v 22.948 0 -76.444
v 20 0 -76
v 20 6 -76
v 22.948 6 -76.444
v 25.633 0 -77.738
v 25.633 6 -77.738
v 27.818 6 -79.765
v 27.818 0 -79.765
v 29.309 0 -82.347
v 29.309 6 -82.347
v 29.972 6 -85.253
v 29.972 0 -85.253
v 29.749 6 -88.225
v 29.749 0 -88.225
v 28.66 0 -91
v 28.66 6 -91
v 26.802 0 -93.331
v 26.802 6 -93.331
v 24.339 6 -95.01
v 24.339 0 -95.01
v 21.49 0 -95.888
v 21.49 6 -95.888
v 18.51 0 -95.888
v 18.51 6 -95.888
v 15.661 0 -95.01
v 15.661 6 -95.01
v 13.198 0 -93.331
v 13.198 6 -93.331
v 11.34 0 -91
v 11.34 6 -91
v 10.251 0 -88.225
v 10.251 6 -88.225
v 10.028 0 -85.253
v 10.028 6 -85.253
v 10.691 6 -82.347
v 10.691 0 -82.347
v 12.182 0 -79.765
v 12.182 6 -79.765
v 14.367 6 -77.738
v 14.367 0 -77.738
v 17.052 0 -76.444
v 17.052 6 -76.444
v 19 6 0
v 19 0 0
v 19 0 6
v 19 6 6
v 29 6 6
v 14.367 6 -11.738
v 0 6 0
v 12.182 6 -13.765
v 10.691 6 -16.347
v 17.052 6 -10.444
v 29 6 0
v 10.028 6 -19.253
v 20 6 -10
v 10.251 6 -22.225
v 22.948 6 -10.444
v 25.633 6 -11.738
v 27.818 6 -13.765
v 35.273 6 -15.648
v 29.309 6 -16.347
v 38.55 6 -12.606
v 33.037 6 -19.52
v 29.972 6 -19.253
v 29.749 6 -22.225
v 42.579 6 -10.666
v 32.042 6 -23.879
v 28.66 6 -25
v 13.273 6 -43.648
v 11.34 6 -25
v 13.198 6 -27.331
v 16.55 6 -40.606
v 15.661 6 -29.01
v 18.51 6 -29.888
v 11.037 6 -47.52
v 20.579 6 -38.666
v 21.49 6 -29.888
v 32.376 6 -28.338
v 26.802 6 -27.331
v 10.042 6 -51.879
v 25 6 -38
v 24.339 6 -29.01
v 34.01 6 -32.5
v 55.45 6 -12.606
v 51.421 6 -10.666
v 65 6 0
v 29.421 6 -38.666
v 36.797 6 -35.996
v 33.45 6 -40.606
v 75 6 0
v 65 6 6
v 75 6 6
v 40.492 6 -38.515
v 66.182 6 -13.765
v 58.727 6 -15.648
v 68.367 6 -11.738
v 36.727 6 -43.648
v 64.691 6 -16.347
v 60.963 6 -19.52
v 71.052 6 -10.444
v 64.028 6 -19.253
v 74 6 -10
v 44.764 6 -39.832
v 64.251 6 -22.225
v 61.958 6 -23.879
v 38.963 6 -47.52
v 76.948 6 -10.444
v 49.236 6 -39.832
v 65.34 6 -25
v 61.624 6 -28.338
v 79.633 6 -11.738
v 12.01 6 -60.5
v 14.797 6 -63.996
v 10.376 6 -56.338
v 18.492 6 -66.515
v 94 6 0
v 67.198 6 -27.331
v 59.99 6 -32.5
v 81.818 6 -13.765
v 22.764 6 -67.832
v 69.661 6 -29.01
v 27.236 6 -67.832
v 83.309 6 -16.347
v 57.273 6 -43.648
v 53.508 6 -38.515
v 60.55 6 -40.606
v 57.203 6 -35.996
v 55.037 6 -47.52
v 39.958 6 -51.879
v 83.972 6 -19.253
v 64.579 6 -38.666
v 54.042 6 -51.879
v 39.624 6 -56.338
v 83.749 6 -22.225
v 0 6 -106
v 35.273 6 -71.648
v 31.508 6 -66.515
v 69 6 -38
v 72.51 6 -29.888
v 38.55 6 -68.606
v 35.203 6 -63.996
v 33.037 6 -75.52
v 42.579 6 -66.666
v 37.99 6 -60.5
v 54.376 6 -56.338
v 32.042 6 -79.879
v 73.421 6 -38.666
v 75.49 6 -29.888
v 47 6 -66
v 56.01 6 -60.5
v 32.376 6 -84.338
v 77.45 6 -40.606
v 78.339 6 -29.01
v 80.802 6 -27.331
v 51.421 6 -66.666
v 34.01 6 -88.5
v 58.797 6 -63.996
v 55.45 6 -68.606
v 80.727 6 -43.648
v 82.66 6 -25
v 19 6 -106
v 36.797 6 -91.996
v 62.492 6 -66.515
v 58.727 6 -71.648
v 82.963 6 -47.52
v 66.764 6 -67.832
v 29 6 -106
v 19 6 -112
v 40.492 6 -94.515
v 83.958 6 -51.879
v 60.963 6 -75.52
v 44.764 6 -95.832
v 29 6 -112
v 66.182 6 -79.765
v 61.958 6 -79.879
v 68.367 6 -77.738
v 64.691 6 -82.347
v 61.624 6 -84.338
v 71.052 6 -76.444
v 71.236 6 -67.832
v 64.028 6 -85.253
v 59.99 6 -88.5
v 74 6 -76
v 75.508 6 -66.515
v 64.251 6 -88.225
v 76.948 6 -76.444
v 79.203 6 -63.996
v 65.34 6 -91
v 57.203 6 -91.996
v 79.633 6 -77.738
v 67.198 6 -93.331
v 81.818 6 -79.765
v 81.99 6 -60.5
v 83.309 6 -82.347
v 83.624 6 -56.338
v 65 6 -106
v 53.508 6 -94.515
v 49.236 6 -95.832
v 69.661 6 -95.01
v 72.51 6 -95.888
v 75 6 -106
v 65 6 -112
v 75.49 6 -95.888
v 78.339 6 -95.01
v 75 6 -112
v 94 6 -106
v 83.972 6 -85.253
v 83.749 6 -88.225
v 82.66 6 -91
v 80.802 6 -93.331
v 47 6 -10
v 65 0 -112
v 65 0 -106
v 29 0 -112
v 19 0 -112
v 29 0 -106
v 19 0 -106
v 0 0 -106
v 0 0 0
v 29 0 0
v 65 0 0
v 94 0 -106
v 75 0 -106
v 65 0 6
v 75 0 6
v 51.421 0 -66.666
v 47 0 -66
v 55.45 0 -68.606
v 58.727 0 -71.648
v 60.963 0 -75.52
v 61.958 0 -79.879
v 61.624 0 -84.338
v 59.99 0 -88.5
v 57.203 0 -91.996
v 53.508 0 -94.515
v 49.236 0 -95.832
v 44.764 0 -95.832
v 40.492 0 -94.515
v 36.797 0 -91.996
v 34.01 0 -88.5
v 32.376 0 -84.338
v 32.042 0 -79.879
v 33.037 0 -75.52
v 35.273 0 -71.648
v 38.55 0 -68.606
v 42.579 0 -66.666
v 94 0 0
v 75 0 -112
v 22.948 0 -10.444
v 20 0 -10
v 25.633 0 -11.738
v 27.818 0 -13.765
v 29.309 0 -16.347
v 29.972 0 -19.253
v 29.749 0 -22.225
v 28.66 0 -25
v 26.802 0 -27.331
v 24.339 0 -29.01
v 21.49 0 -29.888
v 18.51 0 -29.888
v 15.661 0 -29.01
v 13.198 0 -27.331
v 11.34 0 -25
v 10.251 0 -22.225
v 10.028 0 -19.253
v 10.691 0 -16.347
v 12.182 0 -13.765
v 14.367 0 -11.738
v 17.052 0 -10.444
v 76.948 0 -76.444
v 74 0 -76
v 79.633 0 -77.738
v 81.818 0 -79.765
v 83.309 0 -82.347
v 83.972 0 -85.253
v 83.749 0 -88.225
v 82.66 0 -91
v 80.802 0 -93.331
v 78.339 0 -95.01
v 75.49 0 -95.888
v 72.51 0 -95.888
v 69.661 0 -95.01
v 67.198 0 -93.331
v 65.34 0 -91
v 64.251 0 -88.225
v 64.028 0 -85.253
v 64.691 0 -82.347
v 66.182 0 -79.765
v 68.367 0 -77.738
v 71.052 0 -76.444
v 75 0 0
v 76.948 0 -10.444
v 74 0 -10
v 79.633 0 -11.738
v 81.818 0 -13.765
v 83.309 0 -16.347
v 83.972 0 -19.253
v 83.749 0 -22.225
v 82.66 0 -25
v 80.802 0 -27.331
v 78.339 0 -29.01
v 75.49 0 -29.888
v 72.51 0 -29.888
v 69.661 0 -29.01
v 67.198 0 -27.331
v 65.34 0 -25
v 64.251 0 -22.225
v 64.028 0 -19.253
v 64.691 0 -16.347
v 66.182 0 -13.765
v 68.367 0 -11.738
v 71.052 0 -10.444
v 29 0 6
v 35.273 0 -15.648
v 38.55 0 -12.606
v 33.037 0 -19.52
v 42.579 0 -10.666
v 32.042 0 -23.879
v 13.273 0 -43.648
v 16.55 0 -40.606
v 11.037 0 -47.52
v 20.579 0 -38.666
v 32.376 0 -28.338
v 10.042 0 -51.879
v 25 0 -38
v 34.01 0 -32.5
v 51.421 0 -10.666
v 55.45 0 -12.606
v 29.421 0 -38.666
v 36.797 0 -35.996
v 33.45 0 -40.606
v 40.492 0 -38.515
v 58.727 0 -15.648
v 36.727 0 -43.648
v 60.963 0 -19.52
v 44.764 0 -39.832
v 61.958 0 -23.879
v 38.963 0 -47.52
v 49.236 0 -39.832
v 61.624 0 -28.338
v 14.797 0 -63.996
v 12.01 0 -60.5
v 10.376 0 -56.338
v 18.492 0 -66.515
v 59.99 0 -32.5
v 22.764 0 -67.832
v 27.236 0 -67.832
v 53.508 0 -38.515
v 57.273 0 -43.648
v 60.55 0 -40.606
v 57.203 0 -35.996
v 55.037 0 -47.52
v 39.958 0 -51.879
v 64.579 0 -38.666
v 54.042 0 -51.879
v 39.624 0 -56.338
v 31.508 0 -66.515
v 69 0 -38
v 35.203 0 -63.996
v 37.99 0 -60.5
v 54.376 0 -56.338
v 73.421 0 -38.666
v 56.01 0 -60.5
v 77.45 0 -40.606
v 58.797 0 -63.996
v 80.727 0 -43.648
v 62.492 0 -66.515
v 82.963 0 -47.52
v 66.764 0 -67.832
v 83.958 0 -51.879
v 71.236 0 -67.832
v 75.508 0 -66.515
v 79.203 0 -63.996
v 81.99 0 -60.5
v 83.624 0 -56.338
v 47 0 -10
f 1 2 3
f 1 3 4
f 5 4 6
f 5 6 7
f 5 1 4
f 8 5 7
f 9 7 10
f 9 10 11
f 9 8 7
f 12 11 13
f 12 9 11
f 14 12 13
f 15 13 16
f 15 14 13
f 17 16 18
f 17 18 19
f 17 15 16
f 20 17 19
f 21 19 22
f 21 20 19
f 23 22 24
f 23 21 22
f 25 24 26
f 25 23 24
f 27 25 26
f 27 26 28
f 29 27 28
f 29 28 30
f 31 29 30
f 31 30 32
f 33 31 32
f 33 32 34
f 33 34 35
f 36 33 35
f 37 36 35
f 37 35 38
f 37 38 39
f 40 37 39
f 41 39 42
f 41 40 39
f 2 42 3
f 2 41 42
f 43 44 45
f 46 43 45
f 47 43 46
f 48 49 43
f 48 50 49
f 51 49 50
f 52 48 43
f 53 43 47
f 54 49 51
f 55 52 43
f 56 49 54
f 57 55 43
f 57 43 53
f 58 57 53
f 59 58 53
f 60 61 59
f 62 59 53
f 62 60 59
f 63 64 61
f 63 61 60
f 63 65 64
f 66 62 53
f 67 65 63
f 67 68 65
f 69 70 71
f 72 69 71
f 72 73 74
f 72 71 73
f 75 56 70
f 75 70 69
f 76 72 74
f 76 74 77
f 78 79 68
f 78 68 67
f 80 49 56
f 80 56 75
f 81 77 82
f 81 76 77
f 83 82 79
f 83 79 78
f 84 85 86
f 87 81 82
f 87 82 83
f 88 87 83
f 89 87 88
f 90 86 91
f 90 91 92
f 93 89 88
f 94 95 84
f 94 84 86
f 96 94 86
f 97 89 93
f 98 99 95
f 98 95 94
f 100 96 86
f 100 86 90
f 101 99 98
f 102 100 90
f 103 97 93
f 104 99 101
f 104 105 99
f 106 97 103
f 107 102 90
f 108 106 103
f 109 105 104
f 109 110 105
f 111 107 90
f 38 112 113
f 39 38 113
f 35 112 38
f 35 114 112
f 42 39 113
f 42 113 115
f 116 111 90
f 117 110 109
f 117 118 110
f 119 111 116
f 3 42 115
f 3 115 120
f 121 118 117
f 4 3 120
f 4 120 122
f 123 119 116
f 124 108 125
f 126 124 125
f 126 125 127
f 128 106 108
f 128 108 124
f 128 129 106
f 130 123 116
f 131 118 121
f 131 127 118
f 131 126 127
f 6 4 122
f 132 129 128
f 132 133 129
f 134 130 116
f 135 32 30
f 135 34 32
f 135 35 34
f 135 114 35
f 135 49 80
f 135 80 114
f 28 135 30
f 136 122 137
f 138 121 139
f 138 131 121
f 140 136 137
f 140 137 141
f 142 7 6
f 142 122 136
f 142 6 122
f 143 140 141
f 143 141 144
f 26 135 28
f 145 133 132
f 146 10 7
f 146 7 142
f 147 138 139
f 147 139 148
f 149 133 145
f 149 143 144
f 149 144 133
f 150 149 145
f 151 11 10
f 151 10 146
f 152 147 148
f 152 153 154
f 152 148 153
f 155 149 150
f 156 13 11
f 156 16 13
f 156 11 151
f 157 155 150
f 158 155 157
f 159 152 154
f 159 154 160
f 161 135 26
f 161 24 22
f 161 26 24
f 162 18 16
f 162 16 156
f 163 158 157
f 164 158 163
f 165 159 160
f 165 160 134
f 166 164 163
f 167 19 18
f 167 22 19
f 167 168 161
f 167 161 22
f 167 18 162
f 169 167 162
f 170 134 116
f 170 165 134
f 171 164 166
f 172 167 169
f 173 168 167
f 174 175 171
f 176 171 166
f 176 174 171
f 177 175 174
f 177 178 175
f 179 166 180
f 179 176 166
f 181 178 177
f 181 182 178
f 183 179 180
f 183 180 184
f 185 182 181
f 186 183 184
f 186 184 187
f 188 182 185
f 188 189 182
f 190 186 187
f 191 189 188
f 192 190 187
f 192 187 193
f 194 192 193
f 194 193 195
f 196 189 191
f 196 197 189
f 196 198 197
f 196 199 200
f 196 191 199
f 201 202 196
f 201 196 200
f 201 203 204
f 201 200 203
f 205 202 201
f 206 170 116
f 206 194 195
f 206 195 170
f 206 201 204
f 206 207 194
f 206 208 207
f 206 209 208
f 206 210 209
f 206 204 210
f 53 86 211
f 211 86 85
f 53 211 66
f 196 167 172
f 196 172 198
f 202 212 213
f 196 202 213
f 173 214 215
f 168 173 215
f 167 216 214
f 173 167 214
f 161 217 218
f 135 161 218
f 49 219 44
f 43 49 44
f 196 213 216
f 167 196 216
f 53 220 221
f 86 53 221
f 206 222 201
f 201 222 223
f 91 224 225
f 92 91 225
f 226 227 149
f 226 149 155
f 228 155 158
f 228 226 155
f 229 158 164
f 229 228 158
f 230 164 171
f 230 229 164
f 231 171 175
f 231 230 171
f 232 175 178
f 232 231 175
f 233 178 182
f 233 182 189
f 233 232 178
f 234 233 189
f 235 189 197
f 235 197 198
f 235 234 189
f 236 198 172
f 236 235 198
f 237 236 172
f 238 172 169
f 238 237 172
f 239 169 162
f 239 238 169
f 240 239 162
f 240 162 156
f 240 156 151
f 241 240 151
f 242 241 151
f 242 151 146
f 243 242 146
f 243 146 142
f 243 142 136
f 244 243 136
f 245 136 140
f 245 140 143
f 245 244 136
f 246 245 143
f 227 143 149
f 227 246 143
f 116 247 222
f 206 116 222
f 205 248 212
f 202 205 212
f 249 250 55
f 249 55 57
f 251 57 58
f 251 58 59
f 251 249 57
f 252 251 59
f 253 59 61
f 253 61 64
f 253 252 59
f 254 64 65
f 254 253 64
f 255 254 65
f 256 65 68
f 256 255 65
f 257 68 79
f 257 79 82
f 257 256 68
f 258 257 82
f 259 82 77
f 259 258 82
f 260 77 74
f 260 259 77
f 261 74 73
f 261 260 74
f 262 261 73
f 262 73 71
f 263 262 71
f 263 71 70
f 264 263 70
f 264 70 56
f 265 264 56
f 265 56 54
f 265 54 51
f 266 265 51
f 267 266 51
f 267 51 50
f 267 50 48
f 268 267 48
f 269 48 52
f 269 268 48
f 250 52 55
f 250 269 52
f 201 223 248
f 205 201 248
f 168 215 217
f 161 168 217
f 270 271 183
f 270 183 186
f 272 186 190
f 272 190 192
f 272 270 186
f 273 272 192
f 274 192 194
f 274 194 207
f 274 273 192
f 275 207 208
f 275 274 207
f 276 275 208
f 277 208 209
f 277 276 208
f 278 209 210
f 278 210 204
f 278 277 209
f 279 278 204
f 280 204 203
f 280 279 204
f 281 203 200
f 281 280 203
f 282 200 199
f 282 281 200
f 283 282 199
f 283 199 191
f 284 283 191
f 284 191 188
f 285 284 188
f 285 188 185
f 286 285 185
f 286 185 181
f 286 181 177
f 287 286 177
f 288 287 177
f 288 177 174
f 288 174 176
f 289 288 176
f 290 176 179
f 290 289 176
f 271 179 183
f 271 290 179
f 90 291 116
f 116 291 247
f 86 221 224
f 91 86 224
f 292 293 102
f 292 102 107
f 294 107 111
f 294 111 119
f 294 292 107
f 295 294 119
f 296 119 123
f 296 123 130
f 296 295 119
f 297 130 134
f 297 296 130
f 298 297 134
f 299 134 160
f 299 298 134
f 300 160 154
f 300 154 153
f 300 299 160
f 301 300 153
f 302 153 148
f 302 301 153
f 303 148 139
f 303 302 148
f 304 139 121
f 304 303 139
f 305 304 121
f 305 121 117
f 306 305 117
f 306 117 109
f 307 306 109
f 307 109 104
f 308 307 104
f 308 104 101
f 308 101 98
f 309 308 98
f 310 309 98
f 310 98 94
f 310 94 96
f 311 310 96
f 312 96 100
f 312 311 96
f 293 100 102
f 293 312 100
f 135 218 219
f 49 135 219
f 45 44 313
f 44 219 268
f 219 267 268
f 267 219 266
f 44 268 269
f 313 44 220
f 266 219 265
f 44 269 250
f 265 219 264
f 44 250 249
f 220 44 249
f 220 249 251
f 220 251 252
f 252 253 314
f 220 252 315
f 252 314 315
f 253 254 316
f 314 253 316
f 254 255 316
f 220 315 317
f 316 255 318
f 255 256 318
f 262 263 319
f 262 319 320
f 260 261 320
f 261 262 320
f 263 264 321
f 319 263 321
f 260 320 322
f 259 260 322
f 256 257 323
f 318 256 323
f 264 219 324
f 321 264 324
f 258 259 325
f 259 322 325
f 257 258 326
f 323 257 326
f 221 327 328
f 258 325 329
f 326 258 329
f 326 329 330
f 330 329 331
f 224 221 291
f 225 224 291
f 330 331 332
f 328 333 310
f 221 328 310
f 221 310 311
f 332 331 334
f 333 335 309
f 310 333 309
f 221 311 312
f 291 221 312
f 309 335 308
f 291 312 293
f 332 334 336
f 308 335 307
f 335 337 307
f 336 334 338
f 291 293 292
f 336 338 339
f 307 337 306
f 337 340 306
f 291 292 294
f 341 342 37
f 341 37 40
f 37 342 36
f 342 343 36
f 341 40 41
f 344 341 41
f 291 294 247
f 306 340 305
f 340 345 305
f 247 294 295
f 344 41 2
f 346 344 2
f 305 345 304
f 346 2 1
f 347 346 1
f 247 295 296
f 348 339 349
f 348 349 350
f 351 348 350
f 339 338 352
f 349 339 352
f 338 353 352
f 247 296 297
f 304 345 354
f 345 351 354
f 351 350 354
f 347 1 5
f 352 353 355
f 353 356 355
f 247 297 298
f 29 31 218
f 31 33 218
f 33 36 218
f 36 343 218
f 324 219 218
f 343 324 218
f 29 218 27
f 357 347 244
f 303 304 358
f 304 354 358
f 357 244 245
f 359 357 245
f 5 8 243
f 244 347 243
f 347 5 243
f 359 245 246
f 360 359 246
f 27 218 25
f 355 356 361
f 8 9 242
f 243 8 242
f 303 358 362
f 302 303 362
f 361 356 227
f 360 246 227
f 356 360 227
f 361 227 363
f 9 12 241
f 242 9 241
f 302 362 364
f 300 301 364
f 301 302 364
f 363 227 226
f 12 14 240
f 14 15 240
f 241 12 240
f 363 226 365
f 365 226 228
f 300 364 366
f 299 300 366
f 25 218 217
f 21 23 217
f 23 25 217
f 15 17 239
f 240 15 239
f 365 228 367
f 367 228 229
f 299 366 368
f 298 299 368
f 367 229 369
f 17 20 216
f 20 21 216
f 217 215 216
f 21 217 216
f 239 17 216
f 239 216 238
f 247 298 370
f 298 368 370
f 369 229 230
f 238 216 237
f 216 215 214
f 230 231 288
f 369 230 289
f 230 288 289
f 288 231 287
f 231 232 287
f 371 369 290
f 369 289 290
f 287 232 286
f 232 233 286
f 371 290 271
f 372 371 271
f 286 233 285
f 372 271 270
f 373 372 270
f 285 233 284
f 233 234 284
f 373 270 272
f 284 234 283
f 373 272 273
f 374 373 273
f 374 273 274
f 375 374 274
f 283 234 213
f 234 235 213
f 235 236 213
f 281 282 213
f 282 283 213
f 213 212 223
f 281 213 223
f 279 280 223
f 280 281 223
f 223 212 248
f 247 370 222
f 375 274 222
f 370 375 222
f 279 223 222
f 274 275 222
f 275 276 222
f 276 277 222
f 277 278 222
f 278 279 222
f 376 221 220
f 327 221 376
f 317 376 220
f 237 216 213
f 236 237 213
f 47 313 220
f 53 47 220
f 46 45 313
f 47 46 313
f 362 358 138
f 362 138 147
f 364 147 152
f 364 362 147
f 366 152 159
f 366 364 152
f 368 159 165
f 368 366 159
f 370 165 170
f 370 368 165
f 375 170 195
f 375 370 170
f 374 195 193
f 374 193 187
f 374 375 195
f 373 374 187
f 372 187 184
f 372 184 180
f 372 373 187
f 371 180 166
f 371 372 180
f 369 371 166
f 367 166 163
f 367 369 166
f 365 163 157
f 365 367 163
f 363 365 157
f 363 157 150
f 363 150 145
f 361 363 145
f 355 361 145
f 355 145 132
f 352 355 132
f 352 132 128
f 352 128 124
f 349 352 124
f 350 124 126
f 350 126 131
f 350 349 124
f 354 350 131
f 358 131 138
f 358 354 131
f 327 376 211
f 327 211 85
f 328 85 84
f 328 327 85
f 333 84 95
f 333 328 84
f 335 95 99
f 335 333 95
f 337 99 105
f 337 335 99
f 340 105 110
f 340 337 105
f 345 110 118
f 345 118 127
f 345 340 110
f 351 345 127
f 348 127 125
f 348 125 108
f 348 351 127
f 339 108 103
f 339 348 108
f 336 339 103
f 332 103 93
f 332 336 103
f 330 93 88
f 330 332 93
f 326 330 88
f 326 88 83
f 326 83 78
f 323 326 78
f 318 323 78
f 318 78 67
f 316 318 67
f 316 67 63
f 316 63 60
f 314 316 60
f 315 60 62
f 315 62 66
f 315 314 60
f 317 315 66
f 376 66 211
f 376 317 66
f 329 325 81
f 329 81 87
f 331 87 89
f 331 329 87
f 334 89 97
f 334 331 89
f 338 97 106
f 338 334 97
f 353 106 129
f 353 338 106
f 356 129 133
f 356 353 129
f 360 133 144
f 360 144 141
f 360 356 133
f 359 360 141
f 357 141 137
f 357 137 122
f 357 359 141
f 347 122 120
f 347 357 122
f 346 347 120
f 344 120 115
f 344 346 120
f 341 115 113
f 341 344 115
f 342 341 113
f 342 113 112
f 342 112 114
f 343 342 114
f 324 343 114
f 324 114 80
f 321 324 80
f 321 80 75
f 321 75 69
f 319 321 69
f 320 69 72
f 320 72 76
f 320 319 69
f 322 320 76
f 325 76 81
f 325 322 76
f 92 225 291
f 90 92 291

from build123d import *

# Parameters (mm, degrees)
SKETCH1_R           = 15
SKETCH1_R_2         = 10
BOSS_EXTRUDE1_DEPTH = 6


with BuildPart() as part:
    # Sketch1 → Boss-Extrude1 (new body)
    with BuildSketch(Plane(origin=(0, 0, 0), x_dir=(1, 0, 0), z_dir=(0, 1, 0))):
        Polygon((0, 0), (19, 0), (19, -6), (29, -6), (29, 0), (65, 0), (65, -6), (75, -6), (75, 0), (94, 0), (94, 106), (75, 106), (75, 112), (65, 112), (65, 106), (29, 106), (29, 112), (19, 112), (19, 106), (0, 106), align=None)
        with Locations(Location((25, 53, 0), (0, 0, 270))):
            Circle(SKETCH1_R, mode=Mode.SUBTRACT)
        with Locations(Location((69, 53, 0), (0, 0, 270))):
            Circle(SKETCH1_R, mode=Mode.SUBTRACT)
        with Locations(Location((47, 81, 0), (0, 0, 270))):
            Circle(SKETCH1_R, mode=Mode.SUBTRACT)
        with Locations(Location((47, 25, 0), (0, 0, 270))):
            Circle(SKETCH1_R, mode=Mode.SUBTRACT)
        with Locations(Location((20, 20, 0), (0, 0, 270))):
            Circle(SKETCH1_R_2, mode=Mode.SUBTRACT)
        with Locations(Location((20, 86, 0), (0, 0, 270))):
            Circle(SKETCH1_R_2, mode=Mode.SUBTRACT)
        with Locations(Location((74, 86, 0), (0, 0, 270))):
            Circle(SKETCH1_R_2, mode=Mode.SUBTRACT)
        with Locations(Location((74, 20, 0), (0, 0, 270))):
            Circle(SKETCH1_R_2, mode=Mode.SUBTRACT)
    extrude(amount=BOSS_EXTRUDE1_DEPTH)


solid = part.part
